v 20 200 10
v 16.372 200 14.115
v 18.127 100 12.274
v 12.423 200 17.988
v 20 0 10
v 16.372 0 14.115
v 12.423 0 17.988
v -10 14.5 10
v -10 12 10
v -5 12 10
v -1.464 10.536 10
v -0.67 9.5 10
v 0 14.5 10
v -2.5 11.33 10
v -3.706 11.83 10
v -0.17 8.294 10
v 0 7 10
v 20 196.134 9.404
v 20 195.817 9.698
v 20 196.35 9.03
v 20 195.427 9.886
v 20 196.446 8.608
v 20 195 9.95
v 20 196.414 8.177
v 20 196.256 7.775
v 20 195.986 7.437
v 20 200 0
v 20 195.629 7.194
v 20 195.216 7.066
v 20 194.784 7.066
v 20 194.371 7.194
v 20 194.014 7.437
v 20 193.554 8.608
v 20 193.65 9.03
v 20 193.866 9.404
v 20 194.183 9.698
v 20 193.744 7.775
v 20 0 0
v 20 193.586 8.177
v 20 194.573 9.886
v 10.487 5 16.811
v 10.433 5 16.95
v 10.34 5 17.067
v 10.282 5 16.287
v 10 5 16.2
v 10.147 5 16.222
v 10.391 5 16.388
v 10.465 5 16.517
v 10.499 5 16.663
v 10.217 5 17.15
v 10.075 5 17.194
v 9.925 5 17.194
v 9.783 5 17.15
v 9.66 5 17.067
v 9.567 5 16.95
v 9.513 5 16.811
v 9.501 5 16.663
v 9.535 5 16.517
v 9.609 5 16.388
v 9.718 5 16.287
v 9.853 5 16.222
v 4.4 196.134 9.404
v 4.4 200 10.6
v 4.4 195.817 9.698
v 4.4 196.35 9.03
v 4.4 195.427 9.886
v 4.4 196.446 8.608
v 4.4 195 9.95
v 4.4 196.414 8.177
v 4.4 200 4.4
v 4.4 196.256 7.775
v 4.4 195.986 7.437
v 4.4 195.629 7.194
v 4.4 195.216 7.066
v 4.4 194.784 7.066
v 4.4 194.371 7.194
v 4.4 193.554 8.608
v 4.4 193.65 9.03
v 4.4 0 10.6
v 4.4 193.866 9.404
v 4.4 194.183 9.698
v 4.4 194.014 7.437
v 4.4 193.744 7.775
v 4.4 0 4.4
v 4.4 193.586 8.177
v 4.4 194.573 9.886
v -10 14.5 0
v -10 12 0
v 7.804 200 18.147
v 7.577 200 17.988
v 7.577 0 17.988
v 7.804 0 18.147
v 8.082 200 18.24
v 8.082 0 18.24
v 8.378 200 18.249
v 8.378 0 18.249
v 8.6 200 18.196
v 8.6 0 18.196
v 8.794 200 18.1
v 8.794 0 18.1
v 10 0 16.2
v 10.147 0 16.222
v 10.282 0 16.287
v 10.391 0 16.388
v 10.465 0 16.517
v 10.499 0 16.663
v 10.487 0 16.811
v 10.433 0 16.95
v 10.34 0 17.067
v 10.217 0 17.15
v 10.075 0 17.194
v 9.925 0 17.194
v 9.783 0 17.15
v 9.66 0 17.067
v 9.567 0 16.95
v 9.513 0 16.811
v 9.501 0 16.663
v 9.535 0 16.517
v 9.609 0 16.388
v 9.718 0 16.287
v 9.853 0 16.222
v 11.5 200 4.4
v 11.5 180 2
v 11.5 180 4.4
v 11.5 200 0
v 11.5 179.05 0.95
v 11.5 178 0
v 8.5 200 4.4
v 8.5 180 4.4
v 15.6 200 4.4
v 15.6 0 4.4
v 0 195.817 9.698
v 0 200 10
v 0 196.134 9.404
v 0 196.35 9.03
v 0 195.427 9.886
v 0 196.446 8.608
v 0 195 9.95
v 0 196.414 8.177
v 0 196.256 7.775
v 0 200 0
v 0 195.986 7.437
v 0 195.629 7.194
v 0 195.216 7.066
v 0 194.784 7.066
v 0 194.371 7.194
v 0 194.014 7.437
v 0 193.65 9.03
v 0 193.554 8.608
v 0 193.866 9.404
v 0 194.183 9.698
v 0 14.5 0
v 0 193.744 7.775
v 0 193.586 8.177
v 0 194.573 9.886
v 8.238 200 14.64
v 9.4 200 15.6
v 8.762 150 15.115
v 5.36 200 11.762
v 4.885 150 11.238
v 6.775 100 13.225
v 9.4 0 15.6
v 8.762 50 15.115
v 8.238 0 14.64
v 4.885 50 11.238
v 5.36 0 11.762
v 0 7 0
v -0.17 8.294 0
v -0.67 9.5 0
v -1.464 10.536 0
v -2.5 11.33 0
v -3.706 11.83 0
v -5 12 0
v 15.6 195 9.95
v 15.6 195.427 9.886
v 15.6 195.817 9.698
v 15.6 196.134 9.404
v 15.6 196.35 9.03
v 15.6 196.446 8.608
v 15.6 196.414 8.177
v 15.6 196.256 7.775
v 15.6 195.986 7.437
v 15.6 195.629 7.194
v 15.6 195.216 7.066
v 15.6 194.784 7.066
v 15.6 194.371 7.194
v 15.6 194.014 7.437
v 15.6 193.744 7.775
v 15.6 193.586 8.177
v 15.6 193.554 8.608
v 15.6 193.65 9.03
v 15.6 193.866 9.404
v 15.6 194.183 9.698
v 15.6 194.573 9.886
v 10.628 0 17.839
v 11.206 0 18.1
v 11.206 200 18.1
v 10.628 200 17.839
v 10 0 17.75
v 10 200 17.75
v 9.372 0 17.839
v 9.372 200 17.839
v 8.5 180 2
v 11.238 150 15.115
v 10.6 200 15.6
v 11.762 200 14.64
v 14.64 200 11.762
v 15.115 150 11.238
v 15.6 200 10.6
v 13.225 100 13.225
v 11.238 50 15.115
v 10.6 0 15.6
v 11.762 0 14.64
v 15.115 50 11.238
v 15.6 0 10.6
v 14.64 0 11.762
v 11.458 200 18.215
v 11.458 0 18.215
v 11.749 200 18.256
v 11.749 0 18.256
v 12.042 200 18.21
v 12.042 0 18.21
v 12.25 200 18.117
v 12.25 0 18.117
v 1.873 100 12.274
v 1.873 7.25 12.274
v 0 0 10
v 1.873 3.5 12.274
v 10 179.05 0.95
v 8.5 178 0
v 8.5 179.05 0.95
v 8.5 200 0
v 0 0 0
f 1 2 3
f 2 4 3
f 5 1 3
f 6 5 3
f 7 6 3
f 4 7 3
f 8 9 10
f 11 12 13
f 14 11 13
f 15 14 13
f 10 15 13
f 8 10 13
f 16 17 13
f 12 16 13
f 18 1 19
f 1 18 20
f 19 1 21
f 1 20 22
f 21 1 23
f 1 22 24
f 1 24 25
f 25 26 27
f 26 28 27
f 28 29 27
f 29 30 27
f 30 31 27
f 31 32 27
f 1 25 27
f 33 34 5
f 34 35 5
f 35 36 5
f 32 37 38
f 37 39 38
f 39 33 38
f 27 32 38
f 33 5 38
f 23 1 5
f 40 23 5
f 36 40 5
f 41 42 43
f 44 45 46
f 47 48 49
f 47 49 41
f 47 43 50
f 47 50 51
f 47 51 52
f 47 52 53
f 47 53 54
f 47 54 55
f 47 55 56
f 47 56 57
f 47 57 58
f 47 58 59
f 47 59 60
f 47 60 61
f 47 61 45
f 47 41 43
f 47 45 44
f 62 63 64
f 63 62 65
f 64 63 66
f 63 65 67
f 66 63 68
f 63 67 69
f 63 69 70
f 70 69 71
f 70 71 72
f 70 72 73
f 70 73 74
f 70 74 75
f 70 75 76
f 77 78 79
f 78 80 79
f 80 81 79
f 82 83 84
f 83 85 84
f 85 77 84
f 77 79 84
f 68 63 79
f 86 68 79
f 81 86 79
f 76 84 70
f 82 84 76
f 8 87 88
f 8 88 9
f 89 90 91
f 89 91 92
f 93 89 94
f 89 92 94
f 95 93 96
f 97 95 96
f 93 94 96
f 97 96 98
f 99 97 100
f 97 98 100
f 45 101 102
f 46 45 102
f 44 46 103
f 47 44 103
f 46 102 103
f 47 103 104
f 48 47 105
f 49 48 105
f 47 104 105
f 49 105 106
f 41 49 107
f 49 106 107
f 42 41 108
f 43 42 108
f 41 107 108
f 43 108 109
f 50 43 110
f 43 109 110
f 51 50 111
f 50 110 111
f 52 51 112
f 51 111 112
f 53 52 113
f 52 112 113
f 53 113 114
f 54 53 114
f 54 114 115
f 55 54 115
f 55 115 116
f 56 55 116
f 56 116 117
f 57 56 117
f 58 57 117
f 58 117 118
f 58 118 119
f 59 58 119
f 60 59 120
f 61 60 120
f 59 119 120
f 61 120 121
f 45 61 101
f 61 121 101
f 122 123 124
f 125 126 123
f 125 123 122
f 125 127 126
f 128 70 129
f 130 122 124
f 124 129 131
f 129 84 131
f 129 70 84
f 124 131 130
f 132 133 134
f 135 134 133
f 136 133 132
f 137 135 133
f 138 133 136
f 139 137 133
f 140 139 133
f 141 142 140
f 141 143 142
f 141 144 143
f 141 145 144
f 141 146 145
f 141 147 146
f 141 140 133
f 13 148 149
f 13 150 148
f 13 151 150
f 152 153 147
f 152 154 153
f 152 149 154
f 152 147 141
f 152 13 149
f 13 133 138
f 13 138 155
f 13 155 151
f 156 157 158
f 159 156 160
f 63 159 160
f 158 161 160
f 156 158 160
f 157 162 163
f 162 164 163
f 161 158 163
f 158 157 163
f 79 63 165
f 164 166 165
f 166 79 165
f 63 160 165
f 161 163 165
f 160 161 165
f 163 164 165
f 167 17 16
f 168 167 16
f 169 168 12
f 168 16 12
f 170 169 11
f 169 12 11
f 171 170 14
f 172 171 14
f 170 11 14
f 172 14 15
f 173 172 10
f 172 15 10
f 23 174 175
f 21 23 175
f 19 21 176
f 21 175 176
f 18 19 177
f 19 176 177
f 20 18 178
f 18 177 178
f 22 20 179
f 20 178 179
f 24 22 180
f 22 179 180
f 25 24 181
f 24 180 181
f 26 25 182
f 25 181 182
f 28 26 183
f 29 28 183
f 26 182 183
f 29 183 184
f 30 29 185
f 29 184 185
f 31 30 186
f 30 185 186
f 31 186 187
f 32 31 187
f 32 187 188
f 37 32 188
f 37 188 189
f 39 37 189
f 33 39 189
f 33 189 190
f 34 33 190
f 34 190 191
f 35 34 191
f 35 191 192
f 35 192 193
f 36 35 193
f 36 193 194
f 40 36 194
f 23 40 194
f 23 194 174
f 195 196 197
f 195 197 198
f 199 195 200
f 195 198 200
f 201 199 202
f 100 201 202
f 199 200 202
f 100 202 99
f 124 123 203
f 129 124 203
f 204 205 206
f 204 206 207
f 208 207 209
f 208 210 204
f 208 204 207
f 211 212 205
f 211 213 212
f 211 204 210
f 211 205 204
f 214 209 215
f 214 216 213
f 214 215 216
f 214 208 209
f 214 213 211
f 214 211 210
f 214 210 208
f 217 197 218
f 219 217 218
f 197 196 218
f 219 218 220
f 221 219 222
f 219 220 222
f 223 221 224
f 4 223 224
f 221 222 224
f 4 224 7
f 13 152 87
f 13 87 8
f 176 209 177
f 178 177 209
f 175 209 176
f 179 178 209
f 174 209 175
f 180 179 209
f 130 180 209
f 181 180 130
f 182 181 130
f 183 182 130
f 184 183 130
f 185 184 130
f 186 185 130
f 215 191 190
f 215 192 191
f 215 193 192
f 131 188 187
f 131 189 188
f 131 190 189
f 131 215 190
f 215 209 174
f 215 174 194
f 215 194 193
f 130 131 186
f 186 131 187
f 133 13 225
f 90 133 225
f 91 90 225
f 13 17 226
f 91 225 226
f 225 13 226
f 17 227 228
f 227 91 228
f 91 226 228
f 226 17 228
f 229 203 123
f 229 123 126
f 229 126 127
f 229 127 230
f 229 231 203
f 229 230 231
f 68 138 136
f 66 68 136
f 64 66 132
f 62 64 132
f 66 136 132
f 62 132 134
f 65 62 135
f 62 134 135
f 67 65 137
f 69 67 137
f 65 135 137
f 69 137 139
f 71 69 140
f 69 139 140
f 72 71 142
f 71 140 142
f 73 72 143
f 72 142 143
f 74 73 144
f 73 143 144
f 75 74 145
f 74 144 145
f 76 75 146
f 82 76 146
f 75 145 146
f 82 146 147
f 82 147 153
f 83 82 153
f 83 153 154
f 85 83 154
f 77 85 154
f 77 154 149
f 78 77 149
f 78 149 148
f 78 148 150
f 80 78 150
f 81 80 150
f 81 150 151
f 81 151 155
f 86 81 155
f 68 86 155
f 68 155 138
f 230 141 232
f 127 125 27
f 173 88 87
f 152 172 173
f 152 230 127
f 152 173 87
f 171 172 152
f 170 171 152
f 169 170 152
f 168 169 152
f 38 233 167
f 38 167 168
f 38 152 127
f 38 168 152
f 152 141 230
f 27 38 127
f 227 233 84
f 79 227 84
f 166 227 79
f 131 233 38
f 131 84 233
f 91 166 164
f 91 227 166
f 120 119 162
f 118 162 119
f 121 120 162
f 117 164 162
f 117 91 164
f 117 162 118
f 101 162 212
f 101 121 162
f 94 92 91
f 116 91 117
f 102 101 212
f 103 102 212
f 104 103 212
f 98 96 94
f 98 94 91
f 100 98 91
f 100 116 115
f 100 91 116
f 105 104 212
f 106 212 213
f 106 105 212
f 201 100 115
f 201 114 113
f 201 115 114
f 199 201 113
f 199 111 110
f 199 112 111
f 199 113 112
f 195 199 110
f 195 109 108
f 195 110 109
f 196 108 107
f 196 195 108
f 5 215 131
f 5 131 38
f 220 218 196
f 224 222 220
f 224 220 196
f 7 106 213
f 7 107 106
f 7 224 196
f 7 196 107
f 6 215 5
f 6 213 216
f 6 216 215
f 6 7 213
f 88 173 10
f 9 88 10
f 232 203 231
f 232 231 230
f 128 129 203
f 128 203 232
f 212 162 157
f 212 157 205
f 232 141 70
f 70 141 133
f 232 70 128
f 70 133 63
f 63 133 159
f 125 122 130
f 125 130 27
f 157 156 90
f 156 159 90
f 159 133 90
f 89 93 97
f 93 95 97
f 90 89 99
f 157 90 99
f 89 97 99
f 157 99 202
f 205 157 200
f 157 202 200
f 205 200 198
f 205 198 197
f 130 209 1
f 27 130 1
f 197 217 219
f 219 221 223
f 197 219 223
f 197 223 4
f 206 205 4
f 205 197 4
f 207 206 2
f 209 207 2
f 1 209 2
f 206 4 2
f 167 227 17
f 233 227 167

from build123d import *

# Parameters (mm, degrees)
SKETCH1_W           = 20
SKETCH1_H           = 20
SKETCH1_W_2         = 11.2
SKETCH1_H_2         = 11.2
BOSS_EXTRUDE1_DEPTH = 200
SKETCH2_R           = 1.45
CUT_EXTRUDE1_DEPTH  = 202.990098767
FILLET3_SIZE        = 5
FILLET4_SIZE        = 10
SKETCH4_R           = 2.25
CUT_EXTRUDE3_DEPTH  = 202.990098886
FILLET6_R           = 1
SKETCH5_W           = 3
SKETCH5_H           = 20
CUT_EXTRUDE4_DEPTH  = 10
FILLET7_START       = 8.5
FILLET7_DEPTH       = 3
SKETCH7_R           = 0.5
CUT_EXTRUDE6_DEPTH  = 5
SKETCH8_W           = 10
SKETCH8_H           = 2.5
BOSS_EXTRUDE2_DEPTH = 10
FILLET8_R           = 5


with BuildPart() as part:
    # Sketch1 → Boss-Extrude1 (new body)
    with BuildSketch(Plane(origin=(0, 0, 0), x_dir=(1, 0, 0), z_dir=(0, 1, 0))):
        with Locations((10, -10)):
            Rectangle(SKETCH1_W, SKETCH1_H)
        with Locations((10, -10)):
            Rectangle(SKETCH1_W_2, SKETCH1_H_2, mode=Mode.SUBTRACT)
    extrude(amount=BOSS_EXTRUDE1_DEPTH)

    # Sketch2 → Cut-Extrude1 (cut, through all)
    with BuildSketch(Plane.ZY):
        with Locations((8.5, 195)):
            Circle(SKETCH2_R)
    extrude(amount=-CUT_EXTRUDE1_DEPTH, mode=Mode.SUBTRACT)

    # Fillet3
    # a fillet whose section is not a circle: 5 mm, written as the material it adds along each edge
    with BuildSketch(Plane(origin=(4.4, 0, 15.6), x_dir=(1, 0, 0), z_dir=(0, 1, 0))) as fillet3_piece_1:
        with BuildLine():
            Bezier((FILLET3_SIZE, 0), (0, 0), (0, FILLET3_SIZE), weights=[1, 0.052631579, 1])
            Line((0, FILLET3_SIZE), (0, 0))
            Line((0, 0), (FILLET3_SIZE, 0))
        make_face()
    extrude(amount=200)
    with BuildSketch(Plane(origin=(15.6, 0, 15.6), x_dir=(-1, 0, 0), z_dir=(0, 1, 0))) as fillet3_piece_2:
        with BuildLine():
            Bezier((FILLET3_SIZE, 0), (0, 0), (0, -FILLET3_SIZE), weights=[1, 0.052631579, 1])
            Line((0, -FILLET3_SIZE), (0, 0))
            Line((0, 0), (FILLET3_SIZE, 0))
        make_face()
    extrude(amount=200)

    # Fillet4
    # a fillet whose section is not a circle: 10 mm, written as the material it takes off along each edge
    with BuildSketch(Plane(origin=(0, -25, 20), x_dir=(0, 0, -1), z_dir=(0, 1, 0)), Plane(origin=(20, -25, 20), x_dir=(-1, 0, 0), z_dir=(0, 1, 0))) as fillet4_piece_1:
        with BuildLine():
            Bezier((FILLET4_SIZE, 0), (0, 0), (0, -FILLET4_SIZE), weights=[1, 0.052631579, 1])
            Line((0, -FILLET4_SIZE), (0, 0))
            Line((0, 0), (FILLET4_SIZE, 0))
        make_face()
    extrude(amount=250, mode=Mode.SUBTRACT)

    # Sketch4 → Cut-Extrude3 (cut, through all)
    with BuildSketch(Plane(origin=(0, 200, 0), x_dir=(1, 0, 0), z_dir=(0, 1, 0))):
        with Locations((10, -20)):
            Circle(SKETCH4_R)
    extrude(amount=-CUT_EXTRUDE3_DEPTH, mode=Mode.SUBTRACT)

    # Fillet6
    fillet6_edges = [part.edges().sort_by_distance(p)[0] for p in [
        (11.759792875, 100, 18.597991071),
        (8.240207125, 100, 18.597991071),
    ]]
    fillet(fillet6_edges, radius=FILLET6_R)

    # Sketch5 → Cut-Extrude4 (cut)
    with BuildSketch(Plane(origin=(0, 0, 0), x_dir=(-1, 0, 0), z_dir=(0, 0, -1))):
        with Locations((-10, 190)):
            Rectangle(SKETCH5_W, SKETCH5_H)
    extrude(amount=-CUT_EXTRUDE4_DEPTH, mode=Mode.SUBTRACT)

    # Fillet7: read off the stored shape, not the designer's step
    # Fillet7 outline → Fillet7 (cut)
    with BuildSketch(Plane.YZ.offset(FILLET7_START)):
        with BuildLine():
            Line((180, 0), (180, 2))
            add(Edge.make_bspline(
                [(180, 2), (180, 0), (178, 0)],
                knots=[0, 0, 0, 1, 1, 1], degree=2, weights=[1, 0.052631579, 1]))
            Line((178, 0), (180, 0))
        make_face()
    extrude(amount=FILLET7_DEPTH, mode=Mode.SUBTRACT)

    # Sketch7 → Cut-Extrude6 (cut)
    with BuildSketch(Plane(origin=(0, 0, 0), x_dir=(-1, 0, 0), z_dir=(0, -1, 0))):
        with Locations(Location((-10, -16.7, 0), (0, 0, 90))):
            Circle(SKETCH7_R)
    extrude(amount=-CUT_EXTRUDE6_DEPTH, mode=Mode.SUBTRACT)

    # Sketch8 → Boss-Extrude2 (add)
    with BuildSketch(Plane.ZY):
        with Locations((5, 13.25)):
            Rectangle(SKETCH8_W, SKETCH8_H)
    extrude(amount=BOSS_EXTRUDE2_DEPTH)

    # Fillet8
    fillet8_edges = [part.edges().sort_by_distance(p)[0] for p in [
        (0, 12, 5),
    ]]
    fillet(fillet8_edges, radius=FILLET8_R)


solid = part.part
